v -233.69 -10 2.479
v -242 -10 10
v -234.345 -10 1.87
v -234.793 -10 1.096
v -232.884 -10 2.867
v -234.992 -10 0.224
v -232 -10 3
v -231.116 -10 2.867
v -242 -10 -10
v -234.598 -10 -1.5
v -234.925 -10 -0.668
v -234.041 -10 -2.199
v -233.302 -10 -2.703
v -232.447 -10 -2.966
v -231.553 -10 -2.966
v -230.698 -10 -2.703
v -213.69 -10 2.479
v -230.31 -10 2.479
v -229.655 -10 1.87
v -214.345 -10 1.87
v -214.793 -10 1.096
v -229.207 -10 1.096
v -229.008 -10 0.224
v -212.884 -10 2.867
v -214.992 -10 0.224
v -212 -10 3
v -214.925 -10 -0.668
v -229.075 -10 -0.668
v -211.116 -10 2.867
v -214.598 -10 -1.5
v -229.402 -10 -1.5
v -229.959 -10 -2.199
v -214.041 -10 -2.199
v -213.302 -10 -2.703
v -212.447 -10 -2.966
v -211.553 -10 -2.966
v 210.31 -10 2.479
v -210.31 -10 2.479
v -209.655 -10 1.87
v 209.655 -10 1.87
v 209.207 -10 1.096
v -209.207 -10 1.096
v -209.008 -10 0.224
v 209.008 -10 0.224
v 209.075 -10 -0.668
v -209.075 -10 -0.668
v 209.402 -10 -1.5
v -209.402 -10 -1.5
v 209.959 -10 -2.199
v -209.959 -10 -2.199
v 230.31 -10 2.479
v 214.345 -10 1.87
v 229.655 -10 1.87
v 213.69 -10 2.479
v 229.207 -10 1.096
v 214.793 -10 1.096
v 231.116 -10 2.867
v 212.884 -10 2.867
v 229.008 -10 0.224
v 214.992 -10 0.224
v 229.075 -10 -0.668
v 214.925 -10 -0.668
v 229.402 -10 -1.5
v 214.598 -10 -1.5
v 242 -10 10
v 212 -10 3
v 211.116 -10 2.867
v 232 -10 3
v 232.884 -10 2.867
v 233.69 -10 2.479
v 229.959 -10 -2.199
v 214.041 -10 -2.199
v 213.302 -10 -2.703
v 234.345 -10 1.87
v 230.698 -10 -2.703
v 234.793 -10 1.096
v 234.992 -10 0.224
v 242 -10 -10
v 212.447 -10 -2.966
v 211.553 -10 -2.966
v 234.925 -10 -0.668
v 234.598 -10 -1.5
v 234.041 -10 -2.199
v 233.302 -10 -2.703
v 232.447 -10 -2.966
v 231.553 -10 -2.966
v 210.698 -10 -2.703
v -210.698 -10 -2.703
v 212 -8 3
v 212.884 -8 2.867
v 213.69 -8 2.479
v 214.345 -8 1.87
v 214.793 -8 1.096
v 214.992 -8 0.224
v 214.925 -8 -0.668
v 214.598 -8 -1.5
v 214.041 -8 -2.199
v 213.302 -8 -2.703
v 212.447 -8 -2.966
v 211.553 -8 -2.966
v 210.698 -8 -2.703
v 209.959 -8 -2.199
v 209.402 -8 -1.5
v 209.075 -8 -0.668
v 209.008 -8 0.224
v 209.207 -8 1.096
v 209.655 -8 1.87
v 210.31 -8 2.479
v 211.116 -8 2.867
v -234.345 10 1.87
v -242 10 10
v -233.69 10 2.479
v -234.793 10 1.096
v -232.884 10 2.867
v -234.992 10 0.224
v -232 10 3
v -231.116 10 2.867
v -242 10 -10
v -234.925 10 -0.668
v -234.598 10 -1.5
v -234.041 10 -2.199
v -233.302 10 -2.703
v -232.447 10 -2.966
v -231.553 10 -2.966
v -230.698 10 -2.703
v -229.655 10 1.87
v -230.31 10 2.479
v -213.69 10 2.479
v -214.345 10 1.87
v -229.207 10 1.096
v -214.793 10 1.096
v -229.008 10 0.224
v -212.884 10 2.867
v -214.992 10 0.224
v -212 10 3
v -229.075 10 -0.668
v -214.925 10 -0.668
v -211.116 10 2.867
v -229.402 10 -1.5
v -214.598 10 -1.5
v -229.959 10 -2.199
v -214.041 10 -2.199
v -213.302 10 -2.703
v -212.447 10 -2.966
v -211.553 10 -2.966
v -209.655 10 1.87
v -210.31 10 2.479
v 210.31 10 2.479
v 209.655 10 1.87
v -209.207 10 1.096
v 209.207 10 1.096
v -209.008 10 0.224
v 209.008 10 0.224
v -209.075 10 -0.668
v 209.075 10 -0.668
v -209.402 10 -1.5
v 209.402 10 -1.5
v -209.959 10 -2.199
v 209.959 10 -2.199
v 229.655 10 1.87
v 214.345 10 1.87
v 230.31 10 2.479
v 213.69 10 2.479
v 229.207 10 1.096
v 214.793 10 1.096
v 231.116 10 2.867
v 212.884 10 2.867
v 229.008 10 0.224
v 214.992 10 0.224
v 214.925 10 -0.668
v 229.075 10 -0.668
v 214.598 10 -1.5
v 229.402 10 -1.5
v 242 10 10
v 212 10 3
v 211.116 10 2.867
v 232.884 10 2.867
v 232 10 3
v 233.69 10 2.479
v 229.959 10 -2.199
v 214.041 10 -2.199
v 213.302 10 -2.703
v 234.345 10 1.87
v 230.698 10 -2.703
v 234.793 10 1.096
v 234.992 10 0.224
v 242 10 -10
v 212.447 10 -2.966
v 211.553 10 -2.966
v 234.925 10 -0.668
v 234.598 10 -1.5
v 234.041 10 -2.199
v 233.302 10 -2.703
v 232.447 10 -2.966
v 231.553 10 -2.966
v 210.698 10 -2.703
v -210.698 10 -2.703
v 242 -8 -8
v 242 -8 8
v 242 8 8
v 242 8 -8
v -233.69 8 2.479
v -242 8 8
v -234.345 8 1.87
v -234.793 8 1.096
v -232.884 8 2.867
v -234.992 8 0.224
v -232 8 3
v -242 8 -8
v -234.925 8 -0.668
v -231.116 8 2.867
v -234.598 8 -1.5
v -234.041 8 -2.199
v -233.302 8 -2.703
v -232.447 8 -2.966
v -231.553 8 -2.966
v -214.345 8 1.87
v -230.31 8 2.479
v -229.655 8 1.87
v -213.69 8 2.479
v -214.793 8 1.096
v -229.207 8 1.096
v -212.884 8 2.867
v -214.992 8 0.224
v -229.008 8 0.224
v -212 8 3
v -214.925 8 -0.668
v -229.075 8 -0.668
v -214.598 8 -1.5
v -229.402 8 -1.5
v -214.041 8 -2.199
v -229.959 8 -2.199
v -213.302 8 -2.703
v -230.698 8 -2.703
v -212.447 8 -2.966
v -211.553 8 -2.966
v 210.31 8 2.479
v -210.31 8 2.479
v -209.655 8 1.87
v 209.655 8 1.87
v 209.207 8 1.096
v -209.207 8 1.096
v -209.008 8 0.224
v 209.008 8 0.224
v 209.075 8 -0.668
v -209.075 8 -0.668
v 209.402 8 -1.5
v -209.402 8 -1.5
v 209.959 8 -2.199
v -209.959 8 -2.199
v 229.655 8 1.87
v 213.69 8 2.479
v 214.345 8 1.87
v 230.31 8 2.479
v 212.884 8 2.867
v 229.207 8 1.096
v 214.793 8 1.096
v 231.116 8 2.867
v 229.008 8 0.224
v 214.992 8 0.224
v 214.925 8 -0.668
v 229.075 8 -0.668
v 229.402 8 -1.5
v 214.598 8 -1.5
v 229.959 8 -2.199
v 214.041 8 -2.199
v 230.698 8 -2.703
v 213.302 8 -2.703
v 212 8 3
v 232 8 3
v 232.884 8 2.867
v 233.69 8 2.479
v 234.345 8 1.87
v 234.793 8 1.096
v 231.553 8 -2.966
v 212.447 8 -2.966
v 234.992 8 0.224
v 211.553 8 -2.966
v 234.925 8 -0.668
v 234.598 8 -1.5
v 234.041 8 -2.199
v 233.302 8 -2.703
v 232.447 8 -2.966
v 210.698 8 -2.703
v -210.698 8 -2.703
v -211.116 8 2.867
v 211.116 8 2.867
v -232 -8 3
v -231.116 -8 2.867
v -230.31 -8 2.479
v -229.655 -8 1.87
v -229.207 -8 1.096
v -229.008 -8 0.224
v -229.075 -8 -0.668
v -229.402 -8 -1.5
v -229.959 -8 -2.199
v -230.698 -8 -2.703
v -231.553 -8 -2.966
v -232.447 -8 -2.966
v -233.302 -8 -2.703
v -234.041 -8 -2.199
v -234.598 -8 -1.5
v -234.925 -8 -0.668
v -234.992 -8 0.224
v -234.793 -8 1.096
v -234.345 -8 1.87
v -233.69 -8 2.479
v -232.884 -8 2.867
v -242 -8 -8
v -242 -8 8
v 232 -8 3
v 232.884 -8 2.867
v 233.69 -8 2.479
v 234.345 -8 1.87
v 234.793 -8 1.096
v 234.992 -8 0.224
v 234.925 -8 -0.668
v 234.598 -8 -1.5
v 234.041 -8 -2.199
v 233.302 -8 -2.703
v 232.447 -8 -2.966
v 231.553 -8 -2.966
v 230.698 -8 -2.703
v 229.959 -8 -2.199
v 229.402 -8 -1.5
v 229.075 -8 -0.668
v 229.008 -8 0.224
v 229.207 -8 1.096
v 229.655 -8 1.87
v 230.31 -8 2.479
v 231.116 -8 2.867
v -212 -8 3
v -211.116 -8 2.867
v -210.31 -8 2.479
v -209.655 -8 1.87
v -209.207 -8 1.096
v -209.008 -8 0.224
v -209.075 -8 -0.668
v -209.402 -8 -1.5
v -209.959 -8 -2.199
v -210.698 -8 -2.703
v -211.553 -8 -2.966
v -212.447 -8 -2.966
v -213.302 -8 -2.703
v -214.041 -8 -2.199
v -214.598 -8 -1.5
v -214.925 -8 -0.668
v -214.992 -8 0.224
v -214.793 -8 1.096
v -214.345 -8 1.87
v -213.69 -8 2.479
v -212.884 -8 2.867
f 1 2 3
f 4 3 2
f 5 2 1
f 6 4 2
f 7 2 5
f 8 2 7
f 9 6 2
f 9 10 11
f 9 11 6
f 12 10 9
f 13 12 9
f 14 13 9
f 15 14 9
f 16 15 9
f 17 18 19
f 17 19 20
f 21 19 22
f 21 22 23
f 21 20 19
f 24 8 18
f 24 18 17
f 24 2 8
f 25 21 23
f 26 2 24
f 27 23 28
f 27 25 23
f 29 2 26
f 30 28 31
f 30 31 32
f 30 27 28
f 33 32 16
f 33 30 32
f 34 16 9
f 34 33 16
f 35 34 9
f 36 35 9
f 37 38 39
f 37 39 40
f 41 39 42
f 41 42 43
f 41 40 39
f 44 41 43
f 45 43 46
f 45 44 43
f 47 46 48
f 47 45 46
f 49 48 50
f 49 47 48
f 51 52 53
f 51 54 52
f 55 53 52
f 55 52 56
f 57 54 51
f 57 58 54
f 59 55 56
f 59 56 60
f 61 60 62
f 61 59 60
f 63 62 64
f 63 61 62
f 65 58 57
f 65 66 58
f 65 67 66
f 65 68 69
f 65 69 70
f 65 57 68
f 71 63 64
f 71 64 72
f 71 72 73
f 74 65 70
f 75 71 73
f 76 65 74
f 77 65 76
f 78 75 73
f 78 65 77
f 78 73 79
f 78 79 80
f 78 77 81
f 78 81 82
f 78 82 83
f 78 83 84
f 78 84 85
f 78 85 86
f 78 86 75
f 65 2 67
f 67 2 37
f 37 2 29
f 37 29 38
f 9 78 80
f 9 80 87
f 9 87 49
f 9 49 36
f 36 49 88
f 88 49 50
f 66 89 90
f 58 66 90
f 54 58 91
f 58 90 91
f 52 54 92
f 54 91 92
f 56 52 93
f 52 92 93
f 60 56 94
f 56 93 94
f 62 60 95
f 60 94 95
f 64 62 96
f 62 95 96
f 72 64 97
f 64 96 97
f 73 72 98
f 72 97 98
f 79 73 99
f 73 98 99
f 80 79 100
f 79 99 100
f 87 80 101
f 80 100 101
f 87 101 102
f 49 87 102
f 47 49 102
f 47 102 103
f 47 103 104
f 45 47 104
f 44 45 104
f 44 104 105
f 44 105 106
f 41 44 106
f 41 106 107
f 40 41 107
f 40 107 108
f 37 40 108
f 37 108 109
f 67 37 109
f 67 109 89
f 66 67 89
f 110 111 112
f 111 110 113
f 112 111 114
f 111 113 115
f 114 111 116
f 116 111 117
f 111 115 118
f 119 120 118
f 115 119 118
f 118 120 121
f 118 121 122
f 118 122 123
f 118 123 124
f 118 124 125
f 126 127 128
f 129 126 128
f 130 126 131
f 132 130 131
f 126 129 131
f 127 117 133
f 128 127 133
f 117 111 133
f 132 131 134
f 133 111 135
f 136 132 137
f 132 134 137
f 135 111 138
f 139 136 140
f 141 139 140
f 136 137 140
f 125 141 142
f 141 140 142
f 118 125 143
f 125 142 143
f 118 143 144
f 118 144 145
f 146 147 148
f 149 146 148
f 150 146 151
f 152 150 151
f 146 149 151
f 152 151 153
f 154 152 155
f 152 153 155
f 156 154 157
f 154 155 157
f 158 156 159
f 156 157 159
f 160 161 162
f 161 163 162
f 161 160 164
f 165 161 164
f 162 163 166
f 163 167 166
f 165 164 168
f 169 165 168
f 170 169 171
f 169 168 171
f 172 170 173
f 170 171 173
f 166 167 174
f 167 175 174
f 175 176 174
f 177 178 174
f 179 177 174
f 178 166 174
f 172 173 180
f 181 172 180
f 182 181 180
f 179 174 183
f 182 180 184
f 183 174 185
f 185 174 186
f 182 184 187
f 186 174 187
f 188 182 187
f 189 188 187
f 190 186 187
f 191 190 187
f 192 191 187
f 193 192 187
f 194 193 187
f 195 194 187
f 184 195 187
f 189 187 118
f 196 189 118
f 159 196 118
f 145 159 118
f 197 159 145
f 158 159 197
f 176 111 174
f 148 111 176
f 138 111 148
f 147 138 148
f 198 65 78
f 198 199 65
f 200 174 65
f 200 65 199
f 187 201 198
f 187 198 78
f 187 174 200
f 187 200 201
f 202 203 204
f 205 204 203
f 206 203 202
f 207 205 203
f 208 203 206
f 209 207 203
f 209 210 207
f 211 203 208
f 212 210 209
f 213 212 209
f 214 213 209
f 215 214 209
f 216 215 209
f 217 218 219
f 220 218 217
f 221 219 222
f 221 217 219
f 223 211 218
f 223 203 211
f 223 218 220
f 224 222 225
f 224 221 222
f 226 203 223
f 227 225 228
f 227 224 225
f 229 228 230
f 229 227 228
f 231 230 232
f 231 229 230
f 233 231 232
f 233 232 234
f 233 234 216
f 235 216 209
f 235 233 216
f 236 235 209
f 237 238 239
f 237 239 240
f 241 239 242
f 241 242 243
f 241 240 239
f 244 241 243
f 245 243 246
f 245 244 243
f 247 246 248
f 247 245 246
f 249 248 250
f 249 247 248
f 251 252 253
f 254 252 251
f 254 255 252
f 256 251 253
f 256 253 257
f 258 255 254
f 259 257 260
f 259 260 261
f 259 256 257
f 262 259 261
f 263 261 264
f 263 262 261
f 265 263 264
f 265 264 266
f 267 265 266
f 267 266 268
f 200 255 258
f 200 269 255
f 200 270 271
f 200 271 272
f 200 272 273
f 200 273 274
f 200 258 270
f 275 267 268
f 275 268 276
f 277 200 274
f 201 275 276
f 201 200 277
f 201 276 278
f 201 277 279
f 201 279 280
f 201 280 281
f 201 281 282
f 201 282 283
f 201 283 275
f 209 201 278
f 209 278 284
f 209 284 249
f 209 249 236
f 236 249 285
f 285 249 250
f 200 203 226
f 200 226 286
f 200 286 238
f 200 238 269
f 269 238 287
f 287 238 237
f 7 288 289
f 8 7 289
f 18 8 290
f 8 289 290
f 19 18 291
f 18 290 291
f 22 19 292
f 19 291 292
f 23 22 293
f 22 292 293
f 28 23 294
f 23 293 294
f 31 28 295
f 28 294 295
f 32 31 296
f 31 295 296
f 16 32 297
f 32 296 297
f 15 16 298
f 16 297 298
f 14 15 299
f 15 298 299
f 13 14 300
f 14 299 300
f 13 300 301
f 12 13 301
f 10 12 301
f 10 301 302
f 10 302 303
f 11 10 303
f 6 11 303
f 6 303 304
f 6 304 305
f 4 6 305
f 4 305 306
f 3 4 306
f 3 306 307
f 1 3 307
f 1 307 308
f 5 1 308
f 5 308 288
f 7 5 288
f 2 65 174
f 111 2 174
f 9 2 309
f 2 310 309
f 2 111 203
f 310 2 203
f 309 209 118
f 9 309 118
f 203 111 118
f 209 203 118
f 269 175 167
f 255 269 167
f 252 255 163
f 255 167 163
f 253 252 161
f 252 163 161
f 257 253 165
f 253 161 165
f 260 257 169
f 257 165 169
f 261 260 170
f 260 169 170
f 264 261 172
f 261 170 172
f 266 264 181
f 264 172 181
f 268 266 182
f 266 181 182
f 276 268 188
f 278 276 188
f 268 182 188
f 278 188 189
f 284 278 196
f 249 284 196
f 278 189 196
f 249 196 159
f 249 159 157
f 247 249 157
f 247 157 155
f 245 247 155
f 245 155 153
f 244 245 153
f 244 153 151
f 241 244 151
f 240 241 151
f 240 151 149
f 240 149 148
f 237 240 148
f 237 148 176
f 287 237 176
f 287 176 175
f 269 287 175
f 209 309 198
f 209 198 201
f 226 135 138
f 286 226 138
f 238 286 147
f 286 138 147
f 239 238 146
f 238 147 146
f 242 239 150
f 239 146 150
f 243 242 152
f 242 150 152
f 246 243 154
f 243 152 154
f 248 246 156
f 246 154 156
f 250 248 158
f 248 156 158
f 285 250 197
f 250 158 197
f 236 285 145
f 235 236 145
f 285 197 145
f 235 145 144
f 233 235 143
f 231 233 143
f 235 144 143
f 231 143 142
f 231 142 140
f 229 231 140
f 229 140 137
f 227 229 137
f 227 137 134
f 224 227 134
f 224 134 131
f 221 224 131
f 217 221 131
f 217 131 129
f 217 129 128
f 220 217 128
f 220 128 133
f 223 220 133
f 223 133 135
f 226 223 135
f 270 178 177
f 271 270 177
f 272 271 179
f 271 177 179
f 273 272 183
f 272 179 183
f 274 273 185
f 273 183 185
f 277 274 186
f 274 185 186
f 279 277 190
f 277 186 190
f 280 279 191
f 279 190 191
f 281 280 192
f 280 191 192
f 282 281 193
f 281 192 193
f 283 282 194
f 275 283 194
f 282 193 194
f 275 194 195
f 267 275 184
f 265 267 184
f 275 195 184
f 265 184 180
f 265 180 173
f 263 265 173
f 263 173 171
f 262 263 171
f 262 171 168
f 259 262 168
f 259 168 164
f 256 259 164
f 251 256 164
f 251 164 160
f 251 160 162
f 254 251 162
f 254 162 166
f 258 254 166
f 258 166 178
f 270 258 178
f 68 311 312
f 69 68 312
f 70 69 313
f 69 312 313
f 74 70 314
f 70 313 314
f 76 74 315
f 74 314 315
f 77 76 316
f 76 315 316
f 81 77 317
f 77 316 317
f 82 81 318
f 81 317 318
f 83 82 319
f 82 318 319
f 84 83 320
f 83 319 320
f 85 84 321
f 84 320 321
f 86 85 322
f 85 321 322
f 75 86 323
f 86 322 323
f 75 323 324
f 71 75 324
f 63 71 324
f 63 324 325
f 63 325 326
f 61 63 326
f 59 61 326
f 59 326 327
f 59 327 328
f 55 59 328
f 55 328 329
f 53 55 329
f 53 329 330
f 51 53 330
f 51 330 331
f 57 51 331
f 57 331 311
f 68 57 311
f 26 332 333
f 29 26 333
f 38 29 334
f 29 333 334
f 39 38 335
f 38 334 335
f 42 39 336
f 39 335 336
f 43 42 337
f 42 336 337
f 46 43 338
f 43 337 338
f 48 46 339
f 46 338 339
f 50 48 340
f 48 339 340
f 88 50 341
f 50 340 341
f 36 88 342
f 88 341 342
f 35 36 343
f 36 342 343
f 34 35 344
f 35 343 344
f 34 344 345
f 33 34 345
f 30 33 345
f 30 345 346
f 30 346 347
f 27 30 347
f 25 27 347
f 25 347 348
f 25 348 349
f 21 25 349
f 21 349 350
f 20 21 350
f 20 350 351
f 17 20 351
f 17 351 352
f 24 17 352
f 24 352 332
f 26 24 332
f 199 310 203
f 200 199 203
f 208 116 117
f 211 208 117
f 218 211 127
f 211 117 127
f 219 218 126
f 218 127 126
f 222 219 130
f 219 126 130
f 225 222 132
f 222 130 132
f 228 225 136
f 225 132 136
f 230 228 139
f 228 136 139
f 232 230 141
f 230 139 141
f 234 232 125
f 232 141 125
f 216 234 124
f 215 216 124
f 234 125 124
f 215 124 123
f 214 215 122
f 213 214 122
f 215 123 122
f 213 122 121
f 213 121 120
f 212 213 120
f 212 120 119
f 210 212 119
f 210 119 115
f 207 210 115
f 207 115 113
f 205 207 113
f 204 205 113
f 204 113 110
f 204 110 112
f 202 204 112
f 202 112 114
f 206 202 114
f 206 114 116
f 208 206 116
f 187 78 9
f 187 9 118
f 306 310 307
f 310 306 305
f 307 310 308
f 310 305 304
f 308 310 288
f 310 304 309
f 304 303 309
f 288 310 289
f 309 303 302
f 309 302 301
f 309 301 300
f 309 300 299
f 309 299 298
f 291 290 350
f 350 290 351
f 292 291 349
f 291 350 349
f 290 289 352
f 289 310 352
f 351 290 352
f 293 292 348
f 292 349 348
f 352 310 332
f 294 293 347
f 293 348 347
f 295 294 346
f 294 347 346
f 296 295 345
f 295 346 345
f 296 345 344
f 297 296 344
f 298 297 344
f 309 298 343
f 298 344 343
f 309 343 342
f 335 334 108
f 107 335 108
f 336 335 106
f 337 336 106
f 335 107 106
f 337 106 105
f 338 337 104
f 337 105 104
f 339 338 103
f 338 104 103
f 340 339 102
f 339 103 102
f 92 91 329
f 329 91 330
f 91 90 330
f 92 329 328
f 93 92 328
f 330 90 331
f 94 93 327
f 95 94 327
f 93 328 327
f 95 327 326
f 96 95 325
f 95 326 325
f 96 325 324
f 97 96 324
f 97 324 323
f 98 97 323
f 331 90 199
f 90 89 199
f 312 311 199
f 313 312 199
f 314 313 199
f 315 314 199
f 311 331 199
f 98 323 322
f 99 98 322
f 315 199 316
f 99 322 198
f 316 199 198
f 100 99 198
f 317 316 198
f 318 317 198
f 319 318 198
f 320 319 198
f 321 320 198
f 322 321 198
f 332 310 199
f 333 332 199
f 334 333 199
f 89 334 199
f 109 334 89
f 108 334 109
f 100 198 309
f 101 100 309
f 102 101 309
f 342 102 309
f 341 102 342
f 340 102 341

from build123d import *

# Parameters (mm, degrees)
SKETCH1_W           = 20
SKETCH1_H           = 20
SKETCH1_W_2         = 16
SKETCH1_H_2         = 16
BOSS_EXTRUDE1_DEPTH = 242
SKETCH2_R           = 3
CUT_EXTRUDE1_DEPTH  = 244.030862238


with BuildPart() as part:
    # Sketch1 → Boss-Extrude1 (new, symmetric)
    with BuildSketch(Plane(origin=(0, 0, 0), x_dir=(0, 0, -1), z_dir=(1, 0, 0))):
        Rectangle(SKETCH1_W, SKETCH1_H)
        Rectangle(SKETCH1_W_2, SKETCH1_H_2, mode=Mode.SUBTRACT)
    extrude(amount=BOSS_EXTRUDE1_DEPTH, both=True)

    # Sketch2 → Cut-Extrude1 (cut, through all)
    with BuildSketch(Plane(origin=(0, 10, 0), x_dir=(1, 0, 0), z_dir=(0, 1, 0))):
        with Locations(Location((212, 0, 0), (0, 0, 270))):
            Circle(SKETCH2_R)
        with Locations(Location((232, 0, 0), (0, 0, 270))):
            Circle(SKETCH2_R)
        with Locations(Location((-232, 0, 0), (0, 0, 270))):
            Circle(SKETCH2_R)
        with Locations(Location((-212, 0, 0), (0, 0, 270))):
            Circle(SKETCH2_R)
    extrude(amount=-CUT_EXTRUDE1_DEPTH, mode=Mode.SUBTRACT)


solid = part.part
